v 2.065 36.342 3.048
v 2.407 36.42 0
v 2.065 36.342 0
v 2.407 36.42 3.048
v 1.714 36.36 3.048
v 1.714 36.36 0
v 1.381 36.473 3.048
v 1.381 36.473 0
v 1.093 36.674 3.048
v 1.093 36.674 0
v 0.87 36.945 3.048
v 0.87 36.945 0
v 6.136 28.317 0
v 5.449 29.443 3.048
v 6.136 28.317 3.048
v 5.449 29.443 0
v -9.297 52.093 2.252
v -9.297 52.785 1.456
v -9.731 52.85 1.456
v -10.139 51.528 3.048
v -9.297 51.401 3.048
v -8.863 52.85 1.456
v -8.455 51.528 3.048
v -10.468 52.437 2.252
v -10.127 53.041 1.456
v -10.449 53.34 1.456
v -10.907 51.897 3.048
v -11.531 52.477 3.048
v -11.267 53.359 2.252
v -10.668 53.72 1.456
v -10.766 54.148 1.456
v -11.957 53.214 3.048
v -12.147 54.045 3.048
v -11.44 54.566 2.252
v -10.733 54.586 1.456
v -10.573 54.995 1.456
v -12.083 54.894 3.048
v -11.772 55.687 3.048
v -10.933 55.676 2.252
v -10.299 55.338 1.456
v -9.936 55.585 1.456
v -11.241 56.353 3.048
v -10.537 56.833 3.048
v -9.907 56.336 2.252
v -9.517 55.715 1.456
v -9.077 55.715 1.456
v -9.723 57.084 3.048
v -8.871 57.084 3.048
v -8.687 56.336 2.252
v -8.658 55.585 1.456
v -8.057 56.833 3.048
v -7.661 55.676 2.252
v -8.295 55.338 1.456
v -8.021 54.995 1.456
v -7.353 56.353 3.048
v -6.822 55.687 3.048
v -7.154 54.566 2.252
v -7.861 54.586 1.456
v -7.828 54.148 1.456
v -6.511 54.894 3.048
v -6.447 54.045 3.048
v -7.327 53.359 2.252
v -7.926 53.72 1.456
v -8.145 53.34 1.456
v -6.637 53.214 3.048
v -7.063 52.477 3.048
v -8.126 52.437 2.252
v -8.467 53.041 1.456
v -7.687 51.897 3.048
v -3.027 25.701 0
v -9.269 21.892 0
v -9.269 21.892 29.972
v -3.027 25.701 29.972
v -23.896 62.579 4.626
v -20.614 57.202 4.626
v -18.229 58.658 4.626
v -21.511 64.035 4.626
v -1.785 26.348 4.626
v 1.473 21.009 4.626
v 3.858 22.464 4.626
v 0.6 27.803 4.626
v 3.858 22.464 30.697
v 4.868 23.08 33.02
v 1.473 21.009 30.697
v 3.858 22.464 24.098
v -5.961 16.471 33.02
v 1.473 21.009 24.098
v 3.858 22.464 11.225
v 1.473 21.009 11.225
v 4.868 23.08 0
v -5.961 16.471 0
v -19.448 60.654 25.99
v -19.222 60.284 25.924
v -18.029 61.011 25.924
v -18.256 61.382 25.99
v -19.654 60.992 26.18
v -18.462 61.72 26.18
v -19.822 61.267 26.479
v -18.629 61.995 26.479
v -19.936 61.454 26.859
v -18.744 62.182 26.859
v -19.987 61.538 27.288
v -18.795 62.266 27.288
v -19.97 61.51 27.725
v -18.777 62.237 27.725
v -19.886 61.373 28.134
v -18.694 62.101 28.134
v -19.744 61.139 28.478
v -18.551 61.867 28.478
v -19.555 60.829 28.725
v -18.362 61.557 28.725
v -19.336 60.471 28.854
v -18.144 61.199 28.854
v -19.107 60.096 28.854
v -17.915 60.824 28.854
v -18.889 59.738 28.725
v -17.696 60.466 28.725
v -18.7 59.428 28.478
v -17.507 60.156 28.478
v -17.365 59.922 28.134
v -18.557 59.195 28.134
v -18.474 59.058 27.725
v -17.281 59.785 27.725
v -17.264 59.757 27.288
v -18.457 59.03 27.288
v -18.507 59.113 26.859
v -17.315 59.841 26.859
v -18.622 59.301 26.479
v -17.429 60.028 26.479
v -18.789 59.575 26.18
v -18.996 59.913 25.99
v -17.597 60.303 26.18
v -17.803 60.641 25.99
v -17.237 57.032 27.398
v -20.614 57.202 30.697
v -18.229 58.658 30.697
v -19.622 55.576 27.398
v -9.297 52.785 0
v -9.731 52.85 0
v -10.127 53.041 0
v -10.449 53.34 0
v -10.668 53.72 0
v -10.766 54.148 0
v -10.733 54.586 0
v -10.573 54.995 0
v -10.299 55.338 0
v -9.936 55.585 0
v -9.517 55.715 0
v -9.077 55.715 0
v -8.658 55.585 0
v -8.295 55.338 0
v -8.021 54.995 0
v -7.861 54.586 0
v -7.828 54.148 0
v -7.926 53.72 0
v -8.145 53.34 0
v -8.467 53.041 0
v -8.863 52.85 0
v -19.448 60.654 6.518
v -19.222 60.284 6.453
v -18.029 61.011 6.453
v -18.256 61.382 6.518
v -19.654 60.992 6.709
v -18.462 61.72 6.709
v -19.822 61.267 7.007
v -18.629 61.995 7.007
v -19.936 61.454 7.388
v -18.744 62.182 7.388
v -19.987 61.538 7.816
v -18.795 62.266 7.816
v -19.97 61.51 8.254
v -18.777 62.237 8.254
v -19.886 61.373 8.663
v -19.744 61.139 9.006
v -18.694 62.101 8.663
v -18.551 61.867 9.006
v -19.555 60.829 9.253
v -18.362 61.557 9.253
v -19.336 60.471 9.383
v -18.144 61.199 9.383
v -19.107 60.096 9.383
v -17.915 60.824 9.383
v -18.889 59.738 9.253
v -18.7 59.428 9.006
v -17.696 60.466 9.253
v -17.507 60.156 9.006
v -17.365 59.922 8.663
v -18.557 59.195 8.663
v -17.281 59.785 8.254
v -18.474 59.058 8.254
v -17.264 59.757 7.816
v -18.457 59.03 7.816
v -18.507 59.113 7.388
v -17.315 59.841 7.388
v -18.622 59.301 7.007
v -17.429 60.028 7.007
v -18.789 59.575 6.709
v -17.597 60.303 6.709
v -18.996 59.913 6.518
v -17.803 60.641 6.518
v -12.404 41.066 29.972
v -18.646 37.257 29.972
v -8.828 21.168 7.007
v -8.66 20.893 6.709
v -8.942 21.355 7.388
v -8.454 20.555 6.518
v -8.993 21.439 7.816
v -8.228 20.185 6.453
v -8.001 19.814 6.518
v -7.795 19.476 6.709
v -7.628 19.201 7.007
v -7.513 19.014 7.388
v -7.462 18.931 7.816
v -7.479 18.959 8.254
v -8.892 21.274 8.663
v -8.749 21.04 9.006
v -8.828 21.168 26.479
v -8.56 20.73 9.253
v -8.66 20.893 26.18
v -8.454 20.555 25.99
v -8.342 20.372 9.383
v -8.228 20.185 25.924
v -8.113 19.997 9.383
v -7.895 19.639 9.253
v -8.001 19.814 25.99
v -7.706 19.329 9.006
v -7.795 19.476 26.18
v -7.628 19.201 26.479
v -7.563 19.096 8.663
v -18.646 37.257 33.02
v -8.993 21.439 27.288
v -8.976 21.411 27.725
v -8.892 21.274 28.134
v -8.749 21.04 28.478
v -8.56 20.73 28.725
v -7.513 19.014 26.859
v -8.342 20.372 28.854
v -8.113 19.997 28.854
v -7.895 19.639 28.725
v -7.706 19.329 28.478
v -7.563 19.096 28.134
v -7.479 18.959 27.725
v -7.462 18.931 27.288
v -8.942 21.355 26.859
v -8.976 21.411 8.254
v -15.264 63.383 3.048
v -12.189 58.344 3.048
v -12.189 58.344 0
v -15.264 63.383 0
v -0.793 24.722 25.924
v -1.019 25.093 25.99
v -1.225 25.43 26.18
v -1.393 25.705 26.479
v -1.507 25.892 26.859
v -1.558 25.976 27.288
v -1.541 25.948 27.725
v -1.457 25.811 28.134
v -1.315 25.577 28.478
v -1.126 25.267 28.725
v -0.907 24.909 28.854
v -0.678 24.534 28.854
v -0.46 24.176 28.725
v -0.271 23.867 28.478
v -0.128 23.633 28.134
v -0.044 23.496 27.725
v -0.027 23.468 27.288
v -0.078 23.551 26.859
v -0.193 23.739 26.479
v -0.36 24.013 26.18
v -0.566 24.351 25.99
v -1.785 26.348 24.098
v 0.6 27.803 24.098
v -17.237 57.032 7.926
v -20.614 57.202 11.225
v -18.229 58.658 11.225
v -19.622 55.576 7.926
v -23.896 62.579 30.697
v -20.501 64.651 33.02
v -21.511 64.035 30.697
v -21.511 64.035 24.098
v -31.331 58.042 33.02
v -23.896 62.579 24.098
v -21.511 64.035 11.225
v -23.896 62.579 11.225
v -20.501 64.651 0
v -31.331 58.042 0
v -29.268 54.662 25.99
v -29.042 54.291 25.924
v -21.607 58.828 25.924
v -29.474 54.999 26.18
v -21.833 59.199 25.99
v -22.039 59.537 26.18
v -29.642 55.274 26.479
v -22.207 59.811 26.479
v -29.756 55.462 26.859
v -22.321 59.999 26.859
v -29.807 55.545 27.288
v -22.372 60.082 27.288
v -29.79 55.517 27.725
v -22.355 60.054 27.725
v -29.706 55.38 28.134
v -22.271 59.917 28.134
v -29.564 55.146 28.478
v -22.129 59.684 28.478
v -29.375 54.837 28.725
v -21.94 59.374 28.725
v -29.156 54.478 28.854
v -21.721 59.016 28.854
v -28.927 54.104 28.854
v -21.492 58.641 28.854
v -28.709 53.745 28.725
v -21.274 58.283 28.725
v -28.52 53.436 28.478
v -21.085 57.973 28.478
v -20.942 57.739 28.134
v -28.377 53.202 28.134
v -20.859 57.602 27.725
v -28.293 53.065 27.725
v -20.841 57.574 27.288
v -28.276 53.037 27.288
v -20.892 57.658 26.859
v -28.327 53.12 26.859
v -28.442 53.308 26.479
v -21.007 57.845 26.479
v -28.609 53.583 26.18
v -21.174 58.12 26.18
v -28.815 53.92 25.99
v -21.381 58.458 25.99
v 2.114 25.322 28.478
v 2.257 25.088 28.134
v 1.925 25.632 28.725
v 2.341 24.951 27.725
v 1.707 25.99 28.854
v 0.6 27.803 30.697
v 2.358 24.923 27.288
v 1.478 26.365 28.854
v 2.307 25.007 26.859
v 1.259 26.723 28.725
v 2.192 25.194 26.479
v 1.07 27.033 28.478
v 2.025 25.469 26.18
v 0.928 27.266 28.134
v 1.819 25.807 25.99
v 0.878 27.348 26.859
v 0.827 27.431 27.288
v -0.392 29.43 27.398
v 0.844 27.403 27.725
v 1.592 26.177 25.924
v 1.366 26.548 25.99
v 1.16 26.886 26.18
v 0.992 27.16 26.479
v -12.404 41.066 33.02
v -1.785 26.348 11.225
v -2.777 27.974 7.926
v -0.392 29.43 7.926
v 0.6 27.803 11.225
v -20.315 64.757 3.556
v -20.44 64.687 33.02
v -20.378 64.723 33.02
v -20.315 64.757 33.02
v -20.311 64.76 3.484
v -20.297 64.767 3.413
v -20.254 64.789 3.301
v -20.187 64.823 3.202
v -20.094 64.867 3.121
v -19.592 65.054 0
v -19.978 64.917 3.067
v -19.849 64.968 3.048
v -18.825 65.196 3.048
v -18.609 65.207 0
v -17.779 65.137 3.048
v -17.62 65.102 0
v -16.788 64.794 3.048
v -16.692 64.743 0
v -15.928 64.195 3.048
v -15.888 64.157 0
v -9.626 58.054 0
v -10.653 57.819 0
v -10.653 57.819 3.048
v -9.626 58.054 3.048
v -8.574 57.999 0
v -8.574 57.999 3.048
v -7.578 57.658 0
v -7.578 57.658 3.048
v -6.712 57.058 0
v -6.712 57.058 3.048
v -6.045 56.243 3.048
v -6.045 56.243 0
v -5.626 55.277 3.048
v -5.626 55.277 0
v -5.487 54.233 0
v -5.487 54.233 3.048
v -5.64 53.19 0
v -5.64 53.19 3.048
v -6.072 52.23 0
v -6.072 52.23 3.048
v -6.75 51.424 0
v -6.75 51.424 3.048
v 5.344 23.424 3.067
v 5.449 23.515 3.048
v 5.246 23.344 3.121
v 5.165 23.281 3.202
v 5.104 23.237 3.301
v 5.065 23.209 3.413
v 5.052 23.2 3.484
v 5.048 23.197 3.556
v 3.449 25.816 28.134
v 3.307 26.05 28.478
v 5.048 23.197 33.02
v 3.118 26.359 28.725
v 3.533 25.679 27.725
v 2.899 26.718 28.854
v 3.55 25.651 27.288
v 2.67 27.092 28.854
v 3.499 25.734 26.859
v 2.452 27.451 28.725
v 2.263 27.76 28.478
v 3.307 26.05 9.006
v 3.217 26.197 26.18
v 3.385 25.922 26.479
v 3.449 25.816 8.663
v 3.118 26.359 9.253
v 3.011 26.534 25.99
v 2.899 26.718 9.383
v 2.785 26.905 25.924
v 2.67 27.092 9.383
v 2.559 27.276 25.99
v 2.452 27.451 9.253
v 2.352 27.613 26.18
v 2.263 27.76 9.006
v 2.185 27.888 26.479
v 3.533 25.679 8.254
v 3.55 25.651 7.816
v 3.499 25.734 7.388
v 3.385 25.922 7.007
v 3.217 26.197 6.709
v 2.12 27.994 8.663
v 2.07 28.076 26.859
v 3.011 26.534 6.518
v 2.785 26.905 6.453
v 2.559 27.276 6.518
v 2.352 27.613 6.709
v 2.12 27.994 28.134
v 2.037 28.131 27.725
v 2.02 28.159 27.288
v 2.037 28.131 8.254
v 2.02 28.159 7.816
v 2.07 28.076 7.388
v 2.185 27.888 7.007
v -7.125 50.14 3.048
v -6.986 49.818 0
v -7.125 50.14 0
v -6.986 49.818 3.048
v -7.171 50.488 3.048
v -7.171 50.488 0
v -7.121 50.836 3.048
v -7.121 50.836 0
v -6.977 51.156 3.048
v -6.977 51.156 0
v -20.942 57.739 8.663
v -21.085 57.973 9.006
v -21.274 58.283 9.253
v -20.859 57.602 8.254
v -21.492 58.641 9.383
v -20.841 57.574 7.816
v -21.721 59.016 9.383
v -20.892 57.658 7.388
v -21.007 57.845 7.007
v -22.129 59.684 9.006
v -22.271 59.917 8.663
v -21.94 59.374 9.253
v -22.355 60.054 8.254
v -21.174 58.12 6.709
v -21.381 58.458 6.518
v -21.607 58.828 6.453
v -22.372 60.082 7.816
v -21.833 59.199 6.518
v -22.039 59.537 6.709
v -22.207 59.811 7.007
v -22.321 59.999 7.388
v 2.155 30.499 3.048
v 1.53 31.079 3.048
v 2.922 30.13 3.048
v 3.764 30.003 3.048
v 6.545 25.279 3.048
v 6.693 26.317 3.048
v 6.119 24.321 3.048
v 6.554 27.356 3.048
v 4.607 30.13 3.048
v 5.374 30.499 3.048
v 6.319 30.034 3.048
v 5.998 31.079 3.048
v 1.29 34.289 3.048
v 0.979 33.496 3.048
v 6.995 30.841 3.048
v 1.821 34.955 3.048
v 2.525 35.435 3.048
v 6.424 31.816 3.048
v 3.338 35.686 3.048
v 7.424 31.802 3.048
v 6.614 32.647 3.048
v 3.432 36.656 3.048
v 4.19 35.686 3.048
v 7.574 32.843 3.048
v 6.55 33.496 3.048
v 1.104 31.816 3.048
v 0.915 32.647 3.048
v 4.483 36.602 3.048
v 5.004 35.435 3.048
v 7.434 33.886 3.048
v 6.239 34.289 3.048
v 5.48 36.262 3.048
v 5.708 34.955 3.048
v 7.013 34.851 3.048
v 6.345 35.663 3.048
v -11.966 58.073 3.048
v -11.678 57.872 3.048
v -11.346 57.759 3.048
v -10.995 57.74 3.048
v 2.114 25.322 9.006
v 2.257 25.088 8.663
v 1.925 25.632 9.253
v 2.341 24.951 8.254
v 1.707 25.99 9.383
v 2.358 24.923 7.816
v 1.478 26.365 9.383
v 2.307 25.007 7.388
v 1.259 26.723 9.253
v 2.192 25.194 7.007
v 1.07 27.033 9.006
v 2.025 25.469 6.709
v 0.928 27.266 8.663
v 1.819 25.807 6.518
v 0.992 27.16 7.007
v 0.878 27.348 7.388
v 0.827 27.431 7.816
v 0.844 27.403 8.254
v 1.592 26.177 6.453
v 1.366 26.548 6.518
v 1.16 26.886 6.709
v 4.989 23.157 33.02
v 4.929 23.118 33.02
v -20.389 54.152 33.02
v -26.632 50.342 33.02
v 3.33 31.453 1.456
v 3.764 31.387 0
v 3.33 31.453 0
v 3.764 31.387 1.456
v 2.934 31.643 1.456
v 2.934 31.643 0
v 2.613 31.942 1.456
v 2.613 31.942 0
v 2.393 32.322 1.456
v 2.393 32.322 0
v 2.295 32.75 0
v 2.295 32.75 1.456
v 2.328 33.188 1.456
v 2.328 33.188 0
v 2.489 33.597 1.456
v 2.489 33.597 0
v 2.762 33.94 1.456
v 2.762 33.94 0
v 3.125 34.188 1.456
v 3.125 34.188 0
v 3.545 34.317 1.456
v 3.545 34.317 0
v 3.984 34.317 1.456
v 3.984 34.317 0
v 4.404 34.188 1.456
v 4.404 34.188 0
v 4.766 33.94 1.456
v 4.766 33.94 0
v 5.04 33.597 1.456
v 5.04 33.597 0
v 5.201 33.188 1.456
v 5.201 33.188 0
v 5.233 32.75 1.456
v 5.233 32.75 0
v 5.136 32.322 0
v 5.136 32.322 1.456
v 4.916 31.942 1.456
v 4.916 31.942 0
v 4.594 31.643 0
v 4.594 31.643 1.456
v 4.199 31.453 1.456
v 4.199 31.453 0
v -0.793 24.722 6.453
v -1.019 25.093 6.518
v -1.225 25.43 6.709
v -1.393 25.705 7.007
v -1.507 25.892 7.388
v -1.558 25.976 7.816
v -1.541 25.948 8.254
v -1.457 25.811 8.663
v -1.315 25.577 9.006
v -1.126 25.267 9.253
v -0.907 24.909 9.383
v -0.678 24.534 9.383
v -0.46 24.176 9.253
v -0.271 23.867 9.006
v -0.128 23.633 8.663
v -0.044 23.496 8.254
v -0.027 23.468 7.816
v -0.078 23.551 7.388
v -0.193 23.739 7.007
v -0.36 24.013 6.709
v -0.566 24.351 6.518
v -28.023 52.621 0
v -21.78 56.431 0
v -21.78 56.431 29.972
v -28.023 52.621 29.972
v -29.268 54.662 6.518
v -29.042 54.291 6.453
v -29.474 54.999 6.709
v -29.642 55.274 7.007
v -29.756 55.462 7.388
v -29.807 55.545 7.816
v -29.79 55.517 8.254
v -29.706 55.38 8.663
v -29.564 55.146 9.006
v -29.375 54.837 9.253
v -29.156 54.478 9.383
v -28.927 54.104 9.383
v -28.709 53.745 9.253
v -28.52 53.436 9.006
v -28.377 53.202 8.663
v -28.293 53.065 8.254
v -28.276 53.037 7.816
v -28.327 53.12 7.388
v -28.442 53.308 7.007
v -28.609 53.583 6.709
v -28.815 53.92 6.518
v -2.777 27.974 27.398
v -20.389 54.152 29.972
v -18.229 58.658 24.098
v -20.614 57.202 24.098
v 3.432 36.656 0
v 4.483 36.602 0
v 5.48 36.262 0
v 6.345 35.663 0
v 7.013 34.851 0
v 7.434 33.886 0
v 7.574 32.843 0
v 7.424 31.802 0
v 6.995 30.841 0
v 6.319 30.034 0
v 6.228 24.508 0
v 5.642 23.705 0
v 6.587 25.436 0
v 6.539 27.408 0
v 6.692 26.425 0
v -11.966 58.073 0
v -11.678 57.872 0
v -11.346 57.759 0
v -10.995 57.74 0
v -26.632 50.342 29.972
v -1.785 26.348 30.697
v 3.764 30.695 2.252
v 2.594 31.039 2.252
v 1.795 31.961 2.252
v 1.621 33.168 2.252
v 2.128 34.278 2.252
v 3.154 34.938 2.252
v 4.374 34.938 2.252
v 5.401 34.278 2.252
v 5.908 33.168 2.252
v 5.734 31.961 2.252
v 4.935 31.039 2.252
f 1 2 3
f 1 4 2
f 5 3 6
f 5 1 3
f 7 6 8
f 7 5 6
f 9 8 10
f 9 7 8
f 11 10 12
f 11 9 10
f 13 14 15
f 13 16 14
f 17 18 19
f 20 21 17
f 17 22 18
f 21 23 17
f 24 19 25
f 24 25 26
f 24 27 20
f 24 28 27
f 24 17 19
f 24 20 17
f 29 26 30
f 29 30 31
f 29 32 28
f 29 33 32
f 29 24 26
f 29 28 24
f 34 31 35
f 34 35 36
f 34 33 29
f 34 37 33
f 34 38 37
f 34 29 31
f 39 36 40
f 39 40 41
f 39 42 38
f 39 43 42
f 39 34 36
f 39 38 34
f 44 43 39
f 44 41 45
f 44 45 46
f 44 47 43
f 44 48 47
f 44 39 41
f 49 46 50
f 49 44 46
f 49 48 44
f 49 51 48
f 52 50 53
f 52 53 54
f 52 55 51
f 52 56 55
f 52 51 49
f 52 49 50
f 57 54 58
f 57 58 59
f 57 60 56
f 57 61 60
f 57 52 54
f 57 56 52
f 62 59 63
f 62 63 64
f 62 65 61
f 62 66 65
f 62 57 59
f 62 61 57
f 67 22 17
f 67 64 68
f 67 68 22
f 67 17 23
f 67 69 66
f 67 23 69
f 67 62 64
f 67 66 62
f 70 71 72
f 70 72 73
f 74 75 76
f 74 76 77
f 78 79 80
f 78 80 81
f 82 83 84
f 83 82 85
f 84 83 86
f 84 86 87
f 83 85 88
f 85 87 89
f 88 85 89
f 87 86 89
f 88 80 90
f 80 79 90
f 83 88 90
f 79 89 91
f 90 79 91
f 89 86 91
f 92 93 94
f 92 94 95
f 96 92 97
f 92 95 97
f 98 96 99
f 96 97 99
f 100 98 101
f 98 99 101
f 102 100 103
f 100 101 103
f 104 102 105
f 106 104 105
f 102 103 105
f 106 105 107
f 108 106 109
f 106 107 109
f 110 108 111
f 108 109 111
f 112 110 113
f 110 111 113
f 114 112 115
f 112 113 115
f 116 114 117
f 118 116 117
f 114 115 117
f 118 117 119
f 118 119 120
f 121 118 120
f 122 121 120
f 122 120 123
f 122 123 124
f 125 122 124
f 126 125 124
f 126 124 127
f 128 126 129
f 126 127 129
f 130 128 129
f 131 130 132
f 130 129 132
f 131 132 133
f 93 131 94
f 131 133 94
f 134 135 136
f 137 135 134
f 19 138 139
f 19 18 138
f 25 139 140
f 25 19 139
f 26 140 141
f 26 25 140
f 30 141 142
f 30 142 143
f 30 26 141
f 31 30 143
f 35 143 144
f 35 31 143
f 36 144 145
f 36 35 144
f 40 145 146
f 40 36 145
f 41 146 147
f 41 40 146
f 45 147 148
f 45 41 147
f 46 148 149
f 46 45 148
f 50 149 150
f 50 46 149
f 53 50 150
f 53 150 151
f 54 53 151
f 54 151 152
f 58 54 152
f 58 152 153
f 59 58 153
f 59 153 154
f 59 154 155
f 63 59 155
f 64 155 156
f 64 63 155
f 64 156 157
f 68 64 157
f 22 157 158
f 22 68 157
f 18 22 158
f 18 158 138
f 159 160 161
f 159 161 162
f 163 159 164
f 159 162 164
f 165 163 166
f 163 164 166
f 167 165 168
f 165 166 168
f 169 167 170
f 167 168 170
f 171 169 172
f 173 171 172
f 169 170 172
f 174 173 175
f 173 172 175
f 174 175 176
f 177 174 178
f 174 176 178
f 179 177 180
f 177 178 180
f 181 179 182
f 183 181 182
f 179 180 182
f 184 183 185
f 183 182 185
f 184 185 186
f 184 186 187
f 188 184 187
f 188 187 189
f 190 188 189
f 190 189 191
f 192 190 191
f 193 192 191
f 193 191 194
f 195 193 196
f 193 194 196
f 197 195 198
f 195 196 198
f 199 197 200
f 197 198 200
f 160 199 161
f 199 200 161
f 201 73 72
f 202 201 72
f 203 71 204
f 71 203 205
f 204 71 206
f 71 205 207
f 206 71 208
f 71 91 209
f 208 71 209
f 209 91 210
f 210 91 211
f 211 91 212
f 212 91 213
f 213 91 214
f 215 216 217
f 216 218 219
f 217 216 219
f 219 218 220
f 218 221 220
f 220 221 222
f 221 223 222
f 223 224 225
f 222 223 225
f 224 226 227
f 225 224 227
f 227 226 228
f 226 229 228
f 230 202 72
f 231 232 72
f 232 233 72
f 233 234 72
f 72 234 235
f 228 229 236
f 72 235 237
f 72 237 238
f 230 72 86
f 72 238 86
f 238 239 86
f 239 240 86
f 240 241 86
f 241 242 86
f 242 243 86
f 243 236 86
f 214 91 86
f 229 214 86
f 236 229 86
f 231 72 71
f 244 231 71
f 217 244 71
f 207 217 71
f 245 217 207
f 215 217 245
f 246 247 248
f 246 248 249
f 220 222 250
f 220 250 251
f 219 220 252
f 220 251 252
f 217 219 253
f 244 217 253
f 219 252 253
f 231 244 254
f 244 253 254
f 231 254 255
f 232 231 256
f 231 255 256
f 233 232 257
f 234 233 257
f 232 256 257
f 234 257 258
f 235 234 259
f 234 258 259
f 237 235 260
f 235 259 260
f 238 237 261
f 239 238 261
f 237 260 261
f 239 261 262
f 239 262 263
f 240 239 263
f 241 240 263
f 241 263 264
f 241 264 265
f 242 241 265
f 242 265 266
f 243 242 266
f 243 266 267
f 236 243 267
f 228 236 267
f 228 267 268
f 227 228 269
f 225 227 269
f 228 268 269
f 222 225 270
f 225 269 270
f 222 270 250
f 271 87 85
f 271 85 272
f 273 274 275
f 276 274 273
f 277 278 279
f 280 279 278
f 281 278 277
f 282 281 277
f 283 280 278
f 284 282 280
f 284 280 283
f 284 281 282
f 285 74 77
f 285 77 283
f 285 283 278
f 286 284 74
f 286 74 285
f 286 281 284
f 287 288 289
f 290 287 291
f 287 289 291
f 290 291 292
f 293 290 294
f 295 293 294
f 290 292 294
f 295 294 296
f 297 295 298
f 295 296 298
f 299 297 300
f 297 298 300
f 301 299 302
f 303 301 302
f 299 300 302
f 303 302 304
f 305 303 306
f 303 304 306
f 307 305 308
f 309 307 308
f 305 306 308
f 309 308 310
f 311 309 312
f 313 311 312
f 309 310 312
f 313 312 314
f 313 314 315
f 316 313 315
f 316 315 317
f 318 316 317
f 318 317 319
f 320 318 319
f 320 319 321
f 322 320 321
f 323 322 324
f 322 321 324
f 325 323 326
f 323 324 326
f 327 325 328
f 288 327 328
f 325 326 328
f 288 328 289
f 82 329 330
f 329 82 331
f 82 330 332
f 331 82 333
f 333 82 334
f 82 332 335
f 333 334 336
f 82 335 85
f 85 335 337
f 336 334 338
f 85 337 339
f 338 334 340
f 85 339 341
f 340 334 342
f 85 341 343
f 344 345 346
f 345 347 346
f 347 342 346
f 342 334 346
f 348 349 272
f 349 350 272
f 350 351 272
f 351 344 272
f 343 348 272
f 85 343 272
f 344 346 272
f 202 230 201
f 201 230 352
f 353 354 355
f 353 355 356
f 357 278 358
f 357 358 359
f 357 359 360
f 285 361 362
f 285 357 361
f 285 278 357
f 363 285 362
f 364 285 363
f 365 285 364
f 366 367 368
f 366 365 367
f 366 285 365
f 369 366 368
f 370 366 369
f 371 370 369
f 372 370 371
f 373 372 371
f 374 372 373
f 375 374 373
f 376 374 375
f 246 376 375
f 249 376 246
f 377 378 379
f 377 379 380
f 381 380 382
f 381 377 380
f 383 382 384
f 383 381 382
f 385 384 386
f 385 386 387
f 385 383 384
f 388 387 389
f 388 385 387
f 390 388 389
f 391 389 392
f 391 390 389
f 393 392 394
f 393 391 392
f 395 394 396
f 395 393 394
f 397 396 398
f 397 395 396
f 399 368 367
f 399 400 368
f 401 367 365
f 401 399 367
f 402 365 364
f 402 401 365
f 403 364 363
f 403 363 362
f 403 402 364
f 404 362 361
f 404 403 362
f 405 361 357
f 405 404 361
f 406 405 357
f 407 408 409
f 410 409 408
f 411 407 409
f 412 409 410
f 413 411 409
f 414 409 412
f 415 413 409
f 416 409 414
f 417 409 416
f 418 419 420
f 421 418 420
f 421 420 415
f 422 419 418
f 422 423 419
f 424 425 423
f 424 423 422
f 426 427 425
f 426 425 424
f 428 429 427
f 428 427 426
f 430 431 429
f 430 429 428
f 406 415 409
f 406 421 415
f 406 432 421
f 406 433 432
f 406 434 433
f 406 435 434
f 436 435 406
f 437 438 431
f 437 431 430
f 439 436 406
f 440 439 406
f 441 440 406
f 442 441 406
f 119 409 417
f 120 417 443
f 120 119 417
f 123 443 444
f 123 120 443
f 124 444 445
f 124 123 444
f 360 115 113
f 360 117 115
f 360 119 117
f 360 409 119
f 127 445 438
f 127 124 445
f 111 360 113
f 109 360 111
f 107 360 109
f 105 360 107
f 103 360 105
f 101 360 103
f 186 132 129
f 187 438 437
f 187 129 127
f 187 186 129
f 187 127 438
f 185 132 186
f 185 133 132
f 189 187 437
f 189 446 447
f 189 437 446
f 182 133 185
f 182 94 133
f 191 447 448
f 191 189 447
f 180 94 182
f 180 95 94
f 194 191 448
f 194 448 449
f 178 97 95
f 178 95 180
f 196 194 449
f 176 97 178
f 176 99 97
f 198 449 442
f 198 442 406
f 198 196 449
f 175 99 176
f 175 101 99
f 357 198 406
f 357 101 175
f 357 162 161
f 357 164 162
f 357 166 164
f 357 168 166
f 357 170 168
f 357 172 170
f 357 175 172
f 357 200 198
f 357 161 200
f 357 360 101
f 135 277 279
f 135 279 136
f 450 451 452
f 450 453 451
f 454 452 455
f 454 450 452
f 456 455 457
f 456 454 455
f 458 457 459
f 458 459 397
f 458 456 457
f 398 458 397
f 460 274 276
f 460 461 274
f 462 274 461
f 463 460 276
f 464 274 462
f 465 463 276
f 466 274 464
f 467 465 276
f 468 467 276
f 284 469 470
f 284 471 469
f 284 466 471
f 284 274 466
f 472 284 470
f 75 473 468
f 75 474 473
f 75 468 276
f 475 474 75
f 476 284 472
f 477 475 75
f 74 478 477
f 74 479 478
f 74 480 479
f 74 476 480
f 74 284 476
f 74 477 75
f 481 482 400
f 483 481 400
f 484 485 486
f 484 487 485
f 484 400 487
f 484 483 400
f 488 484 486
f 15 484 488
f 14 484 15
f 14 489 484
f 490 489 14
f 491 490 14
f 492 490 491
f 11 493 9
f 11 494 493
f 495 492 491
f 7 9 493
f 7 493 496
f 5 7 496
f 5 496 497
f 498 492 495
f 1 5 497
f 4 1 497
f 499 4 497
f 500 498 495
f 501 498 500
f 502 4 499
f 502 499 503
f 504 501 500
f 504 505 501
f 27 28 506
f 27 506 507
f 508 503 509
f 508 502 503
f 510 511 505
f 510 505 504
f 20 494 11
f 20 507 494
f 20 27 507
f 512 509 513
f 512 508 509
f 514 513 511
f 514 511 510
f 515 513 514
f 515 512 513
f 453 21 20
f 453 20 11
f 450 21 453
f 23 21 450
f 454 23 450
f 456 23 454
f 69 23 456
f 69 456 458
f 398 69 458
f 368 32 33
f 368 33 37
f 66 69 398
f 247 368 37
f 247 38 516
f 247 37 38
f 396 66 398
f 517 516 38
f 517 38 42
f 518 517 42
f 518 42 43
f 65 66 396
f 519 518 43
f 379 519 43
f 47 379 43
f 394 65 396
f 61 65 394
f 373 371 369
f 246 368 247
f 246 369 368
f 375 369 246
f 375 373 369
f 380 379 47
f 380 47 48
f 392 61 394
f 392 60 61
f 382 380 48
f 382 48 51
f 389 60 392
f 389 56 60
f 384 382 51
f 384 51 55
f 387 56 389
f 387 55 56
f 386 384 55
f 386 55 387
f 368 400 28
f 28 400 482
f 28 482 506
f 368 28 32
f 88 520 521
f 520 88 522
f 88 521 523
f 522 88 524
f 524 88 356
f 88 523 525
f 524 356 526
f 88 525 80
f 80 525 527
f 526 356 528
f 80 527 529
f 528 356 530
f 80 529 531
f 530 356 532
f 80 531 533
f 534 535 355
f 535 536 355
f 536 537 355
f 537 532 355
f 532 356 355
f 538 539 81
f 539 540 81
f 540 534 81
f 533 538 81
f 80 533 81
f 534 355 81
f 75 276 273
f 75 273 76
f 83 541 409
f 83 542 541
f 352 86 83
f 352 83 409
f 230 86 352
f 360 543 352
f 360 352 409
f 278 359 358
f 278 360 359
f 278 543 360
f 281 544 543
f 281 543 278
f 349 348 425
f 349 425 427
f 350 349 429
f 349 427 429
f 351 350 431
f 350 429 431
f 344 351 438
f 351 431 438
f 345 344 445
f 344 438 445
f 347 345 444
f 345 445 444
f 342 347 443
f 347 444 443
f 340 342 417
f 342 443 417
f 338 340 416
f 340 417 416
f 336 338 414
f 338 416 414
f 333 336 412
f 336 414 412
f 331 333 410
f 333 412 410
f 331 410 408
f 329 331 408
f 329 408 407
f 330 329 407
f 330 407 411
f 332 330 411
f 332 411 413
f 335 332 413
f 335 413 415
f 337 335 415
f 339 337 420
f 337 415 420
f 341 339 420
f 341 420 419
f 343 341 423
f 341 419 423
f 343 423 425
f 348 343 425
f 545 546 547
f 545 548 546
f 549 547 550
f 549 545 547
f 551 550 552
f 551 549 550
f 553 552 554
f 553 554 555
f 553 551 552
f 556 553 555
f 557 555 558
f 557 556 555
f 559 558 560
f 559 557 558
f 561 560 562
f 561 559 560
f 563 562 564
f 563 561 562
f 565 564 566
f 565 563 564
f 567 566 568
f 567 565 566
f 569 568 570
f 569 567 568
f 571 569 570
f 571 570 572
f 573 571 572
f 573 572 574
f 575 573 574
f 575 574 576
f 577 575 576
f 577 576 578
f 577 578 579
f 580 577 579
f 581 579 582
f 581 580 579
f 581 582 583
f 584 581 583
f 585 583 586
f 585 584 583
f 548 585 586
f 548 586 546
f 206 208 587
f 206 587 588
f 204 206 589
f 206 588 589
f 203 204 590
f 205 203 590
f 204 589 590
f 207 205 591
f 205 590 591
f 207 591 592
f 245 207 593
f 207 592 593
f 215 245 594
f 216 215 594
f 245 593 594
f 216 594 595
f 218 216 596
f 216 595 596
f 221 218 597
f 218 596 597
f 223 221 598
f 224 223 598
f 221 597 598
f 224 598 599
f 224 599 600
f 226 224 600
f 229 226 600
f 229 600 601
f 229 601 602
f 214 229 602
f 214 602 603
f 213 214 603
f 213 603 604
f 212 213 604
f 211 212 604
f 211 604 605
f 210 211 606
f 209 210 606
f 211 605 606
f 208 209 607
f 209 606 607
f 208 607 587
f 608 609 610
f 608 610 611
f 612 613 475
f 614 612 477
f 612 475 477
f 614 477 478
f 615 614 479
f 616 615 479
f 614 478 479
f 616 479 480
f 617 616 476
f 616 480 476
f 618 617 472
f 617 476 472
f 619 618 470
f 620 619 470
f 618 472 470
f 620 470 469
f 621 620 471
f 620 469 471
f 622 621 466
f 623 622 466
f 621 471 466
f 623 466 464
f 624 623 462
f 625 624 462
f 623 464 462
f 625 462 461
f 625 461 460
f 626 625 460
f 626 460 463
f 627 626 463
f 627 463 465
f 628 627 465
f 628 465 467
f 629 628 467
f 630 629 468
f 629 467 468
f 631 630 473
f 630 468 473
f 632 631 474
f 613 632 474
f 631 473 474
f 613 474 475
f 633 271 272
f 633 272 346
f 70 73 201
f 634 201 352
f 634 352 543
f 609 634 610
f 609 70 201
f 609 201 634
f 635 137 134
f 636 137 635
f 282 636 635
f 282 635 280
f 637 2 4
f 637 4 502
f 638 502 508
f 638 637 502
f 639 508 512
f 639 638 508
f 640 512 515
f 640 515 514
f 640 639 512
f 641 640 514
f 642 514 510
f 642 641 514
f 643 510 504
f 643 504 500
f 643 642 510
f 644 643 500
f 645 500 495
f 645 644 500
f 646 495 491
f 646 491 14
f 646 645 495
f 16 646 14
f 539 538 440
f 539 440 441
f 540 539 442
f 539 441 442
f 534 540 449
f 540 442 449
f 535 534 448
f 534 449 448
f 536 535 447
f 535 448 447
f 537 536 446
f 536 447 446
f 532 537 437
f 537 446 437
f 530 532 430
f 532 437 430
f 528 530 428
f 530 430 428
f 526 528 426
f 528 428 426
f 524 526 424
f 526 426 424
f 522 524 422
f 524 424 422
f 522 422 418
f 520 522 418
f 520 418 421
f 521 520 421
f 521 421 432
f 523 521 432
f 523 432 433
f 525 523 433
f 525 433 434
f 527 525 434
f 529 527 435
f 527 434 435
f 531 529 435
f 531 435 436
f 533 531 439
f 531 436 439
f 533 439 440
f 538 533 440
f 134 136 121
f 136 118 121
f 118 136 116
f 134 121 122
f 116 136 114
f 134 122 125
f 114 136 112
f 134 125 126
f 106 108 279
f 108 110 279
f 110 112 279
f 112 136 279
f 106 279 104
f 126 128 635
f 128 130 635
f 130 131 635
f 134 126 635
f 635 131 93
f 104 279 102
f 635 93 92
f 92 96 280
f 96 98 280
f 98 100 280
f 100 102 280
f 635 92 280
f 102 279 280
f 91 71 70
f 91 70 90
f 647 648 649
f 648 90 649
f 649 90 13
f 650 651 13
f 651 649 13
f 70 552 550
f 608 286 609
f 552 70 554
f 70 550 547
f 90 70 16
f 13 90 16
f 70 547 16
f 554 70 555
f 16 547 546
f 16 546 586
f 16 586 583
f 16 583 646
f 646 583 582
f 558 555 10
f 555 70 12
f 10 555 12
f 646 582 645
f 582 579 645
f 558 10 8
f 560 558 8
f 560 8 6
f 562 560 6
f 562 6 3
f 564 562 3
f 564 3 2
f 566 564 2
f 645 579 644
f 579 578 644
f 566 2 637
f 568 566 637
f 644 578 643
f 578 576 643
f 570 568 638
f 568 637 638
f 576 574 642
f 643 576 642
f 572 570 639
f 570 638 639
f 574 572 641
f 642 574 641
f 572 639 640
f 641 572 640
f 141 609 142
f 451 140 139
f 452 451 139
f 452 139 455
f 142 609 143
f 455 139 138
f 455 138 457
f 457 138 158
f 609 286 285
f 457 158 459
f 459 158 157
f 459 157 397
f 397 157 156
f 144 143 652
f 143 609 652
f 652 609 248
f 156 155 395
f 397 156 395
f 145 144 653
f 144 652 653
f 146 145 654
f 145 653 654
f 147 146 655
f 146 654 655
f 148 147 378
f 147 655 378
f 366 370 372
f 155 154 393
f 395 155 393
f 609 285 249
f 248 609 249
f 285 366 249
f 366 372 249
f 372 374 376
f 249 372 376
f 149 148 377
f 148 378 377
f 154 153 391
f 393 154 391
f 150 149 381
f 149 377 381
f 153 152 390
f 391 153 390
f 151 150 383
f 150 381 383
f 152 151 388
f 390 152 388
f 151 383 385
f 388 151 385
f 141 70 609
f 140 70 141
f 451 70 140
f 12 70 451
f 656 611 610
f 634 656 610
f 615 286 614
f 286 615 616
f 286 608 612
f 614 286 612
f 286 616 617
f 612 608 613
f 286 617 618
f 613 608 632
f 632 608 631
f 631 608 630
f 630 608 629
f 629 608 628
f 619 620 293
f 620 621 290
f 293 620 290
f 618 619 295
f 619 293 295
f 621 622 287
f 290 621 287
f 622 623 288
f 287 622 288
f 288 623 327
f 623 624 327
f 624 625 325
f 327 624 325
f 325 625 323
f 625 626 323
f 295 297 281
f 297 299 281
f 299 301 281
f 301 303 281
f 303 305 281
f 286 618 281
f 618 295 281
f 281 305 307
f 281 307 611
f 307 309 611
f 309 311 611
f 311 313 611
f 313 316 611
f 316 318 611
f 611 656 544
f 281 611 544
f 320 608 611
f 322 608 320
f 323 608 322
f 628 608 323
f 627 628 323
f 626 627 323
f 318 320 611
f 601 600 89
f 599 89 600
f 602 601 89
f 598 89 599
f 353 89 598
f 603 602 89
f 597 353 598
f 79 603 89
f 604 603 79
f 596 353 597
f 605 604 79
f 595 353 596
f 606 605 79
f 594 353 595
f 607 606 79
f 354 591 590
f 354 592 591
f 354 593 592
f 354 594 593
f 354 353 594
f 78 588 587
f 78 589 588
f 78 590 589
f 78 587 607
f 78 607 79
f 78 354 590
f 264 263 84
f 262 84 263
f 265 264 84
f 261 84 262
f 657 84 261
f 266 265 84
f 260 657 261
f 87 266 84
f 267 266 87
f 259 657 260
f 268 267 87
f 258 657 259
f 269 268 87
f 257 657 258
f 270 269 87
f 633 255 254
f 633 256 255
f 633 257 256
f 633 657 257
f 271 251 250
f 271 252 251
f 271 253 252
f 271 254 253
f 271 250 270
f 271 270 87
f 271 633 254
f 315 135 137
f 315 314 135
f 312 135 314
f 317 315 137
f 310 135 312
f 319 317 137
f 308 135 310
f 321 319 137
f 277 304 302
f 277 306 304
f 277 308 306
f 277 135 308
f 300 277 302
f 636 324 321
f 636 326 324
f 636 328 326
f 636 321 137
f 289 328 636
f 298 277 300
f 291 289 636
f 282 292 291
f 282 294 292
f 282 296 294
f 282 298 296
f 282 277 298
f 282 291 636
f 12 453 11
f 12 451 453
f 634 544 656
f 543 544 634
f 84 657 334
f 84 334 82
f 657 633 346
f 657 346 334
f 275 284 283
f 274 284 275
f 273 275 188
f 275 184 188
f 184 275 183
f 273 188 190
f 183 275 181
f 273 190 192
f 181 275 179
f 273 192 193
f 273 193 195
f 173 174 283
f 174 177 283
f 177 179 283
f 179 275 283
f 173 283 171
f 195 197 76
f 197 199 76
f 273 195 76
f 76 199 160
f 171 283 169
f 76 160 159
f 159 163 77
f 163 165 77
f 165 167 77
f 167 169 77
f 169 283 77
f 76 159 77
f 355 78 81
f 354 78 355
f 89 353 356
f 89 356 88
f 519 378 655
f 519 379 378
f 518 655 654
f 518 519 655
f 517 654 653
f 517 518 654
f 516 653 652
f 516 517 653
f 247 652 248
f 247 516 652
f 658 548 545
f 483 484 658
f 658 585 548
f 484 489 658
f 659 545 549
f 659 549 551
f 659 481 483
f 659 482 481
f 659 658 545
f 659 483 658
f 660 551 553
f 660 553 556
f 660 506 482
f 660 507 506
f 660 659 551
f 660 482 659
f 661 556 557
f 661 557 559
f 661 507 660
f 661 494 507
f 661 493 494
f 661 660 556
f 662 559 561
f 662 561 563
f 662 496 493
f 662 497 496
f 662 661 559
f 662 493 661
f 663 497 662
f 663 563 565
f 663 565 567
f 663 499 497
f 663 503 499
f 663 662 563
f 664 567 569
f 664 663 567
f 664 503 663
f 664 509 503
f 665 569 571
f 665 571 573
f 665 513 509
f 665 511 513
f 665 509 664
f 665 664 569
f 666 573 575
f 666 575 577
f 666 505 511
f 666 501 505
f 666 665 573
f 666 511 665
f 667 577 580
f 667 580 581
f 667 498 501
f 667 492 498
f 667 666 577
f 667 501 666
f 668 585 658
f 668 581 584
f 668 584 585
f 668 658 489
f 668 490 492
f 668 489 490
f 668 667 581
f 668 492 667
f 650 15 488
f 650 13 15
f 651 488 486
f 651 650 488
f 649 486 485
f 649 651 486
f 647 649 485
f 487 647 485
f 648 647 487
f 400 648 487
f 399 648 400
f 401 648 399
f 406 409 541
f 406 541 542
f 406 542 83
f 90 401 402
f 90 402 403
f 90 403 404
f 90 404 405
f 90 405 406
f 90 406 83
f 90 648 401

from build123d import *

# Parameters (mm, degrees)
BOSS_EXTRUDE1_DEPTH                               = 3.048
BOSS_EXTRUDE2_DEPTH                               = 29.971999999999998
BOSS_EXTRUDE3_DEPTH                               = 3.048
BOSS_EXTRUDE4_DEPTH                               = 3.048
SKETCH13_W                                        = 29.972
SKETCH13_H                                        = 48.7
BOSS_EXTRUDE5_DEPTH                               = 3.048
CSK_FOR_4_FLAT_HEAD_MACHINE_SCREW_100_D           = 2.9464
CSK_FOR_4_FLAT_HEAD_MACHINE_SCREW_100_CSINK_D     = 5.715
CSK_FOR_4_FLAT_HEAD_MACHINE_SCREW_100_CSINK_ANGLE = 100
CUT_EXTRUDE1_DEPTH                                = 1.397
CUT_EXTRUDE1_DEPTH_BACK                           = 1.397
SKETCH15_R                                        = 9.184035329670005
SKETCH15_R_2                                      = 8.124741076595411
SKETCH15_R_3                                      = 8.201451240556812
SKETCH15_R_4                                      = 5.810172256980604
BOSS_EXTRUDE6_DEPTH                               = 3.048
CSK_FOR_4_FLAT_HEAD_MACHINE_SCREW1_AT_2_COUNT     = 2
CSK_FOR_4_FLAT_HEAD_MACHINE_SCREW1_AT_2_PITCH     = 35.474094707842795
CSK_FOR_4_FLAT_HEAD_MACHINE_SCREW1_AT_3_COUNT     = 2
CSK_FOR_4_FLAT_HEAD_MACHINE_SCREW1_AT_3_PITCH     = 43.70753982500484
CSK_FOR_4_FLAT_HEAD_MACHINE_SCREW1_AT_4_COUNT     = 2
CSK_FOR_4_FLAT_HEAD_MACHINE_SCREW1_AT_4_PITCH     = 25.069264350610375
CUT_EXTRUDE2_DEPTH                                = 3.048
FILLET3_R                                         = 3.8099999999999996
FILLET4_R                                         = 1.27
SKETCH21_W                                        = 2.540000000000001
SKETCH21_H                                        = 33.02
CUT_EXTRUDE3_DEPTH                                = 77.47
FILLET5_R                                         = 0.508
FILLET6_R                                         = 0.508
SKETCH22_W                                        = 123.04970813102194
SKETCH22_H                                        = 134.7131875745612
CUT_EXTRUDE4_DEPTH                                = 77.47


with BuildPart() as part:
    # Sketch2 → Boss-Extrude1 (new body)
    with BuildSketch(Plane.XY):
        Polygon((-47.58059551455695, 48.12489153745831), (-22.21147896413696, 6.554494312375088), (5.701292889255674, 23.58878817682547), (-19.667823661164306, 65.1591854019087), align=None)
        Polygon((-38.85234269167306, 46.0124042215628), (-20.098991648241444, 15.282747135258976), (-3.0269599336282123, 25.701275492720985), (-21.78031097705982, 56.430932579024805), align=None, mode=Mode.SUBTRACT)
    extrude(amount=BOSS_EXTRUDE1_DEPTH)

    # Sketch3 → Boss-Extrude2 (add)
    with BuildSketch(Plane.XY.offset(3.048)):
        Polygon((2.4490708476218597, 21.604058524728963), (-22.920045702798127, 63.17445574981219), (-44.328373472923126, 50.10962118955482), (-18.95925692250314, 8.539223964471608), align=None)
        Polygon((-38.85234269167306, 46.0124042215628), (-20.098991648241444, 15.282747135258976), (-3.0269599336282087, 25.701275492720985), (-21.78031097705982, 56.430932579024805), align=None, mode=Mode.SUBTRACT)
    extrude(amount=BOSS_EXTRUDE2_DEPTH)

    # Sketch4 → Boss-Extrude3 (add)
    with BuildSketch(Plane.XY.offset(33.02)):
        Polygon((-38.85234269167306, 46.0124042215628), (-37.46131723814535, 43.733039051773666), (-20.389285523532113, 54.15156740923567), (-21.78031097705982, 56.430932579024805), align=None)
        Polygon((-29.47566716995725, 30.647575678410885), (-12.403635455344016, 41.0661040358729), (-3.0269599336282087, 25.701275492720985), (-20.098991648241444, 15.282747135258976), align=None)
    extrude(amount=-BOSS_EXTRUDE3_DEPTH)

    # Sketch12 → Boss-Extrude4 (add)
    with BuildSketch(Plane.XY.offset(3.048)):
        Polygon((2.4490708476218597, 21.604058524728963), (5.701292889255674, 23.58878817682547), (8.120429940678708, 25.065112049236276), (-17.248686609741274, 66.6355092743195), (-22.920045702798127, 63.17445574981219), align=None)
    extrude(amount=-BOSS_EXTRUDE4_DEPTH)

    # Sketch13 → Boss-Extrude5 (add)
    with BuildSketch(Plane(origin=(11.391019162328917, 6.95158362794815, 0), x_dir=(0, 0, -1), z_dir=(0.8536015857306615, 0.5209264178731006, 0))):
        with Locations((-18.034000000000002, 41.515472911157566)):
            Rectangle(SKETCH13_W, SKETCH13_H)
    extrude(amount=BOSS_EXTRUDE5_DEPTH)

    # CSK for #4 Flat Head Machine Screw (100)2 (through all)
    with Locations(Plane(origin=(-10.017308607796087, -6.113250932309213, 0), x_dir=(0, 0, 1), z_dir=(-0.8536015857306615, -0.5209264178731007, 0))):
        with Locations((27.397617355, 61.471448289), (7.925915452, 61.471448289), (7.925915452, 21.515515982), (27.397617355, 21.515515982)):
            CounterSinkHole(CSK_FOR_4_FLAT_HEAD_MACHINE_SCREW_100_D / 2, CSK_FOR_4_FLAT_HEAD_MACHINE_SCREW_100_CSINK_D / 2, counter_sink_angle=CSK_FOR_4_FLAT_HEAD_MACHINE_SCREW_100_CSINK_ANGLE)

    # Sketch14 → Cut-Extrude1 (cut, two sides: drawn at the far end of the back side and taken through both)
    with BuildSketch(Plane(origin=(11.607833965104508, 7.083898938087922, 0), x_dir=(0, 0, -1), z_dir=(0.8536015857306615, 0.5209264178731005, 0)).offset(-CUT_EXTRUDE1_DEPTH_BACK)):
        Polygon((-30.697174143874744, 19.61051598216394), (-30.697174143874744, 14.979833054183299), (-24.09806056703731, 14.979833054183299), (-24.09806056703731, 19.610515982163985), (-24.098060567037347, 23.42051598216399), (-27.39761735545604, 25.325515982163957), (-30.697174143874758, 23.420515982163952), align=None)
        Polygon((-27.39761735545604, 57.661448288693826), (-24.098060567037333, 59.56644828869383), (-24.098060567037336, 63.37644828869381), (-24.098060567037336, 70.99644828869384), (-30.69717414387474, 70.99644828869384), (-30.69717414387474, 63.37644828869381), (-30.69717414387474, 59.56644828869381), align=None)
        Polygon((-7.925915451689084, 57.661448288693826), (-4.626358663270381, 59.56644828869382), (-4.626358663270402, 63.37644828869381), (-4.626358663270402, 70.99644828869384), (-11.225472240107786, 70.99644828869384), (-11.225472240107786, 63.376448288693766), (-11.225472240107747, 59.566448288693785), align=None)
        Polygon((-7.925915451689081, 25.325515982163946), (-11.225472240107791, 23.42051598216395), (-11.225472240107791, 19.610515982163946), (-11.225472240107791, 14.979833054183299), (-4.626358663270366, 14.979833054183299), (-4.626358663270366, 19.610515982163953), (-4.6263586632703655, 23.420515982163952), align=None)
    extrude(amount=CUT_EXTRUDE1_DEPTH + CUT_EXTRUDE1_DEPTH_BACK, mode=Mode.SUBTRACT)

    # Sketch15 → Boss-Extrude6 (add)
    with BuildSketch(Plane(origin=(0, 0, 0), x_dir=(-1, 0, 0), z_dir=(0, 0, -1))):
        with Locations((9.758086495919196, 54.36124573948299)):
            Circle(SKETCH15_R)
        with Locations((39.927818301519274, 35.58488100974543)):
            Circle(SKETCH15_R_2)
        with Locations((25.610425726235285, 18.04643091882164)):
            Circle(SKETCH15_R_3)
        with Locations((-3.4576236647063787, 32.70568986323082)):
            Circle(SKETCH15_R_4)
    extrude(amount=-BOSS_EXTRUDE6_DEPTH)

    # Sketch19 → CSK for #4 Flat Head Machine Screw1 (revolve, cut)
    with BuildSketch(Plane(origin=(3.764373982237945, 32.86032278852424, 3.048), x_dir=(0, -1, 0), z_dir=(1, 0, 0))):
        Polygon((0, 0), (-7.5e-16, 3.0480000000000023), (1.4731999999999932, 3.0480000000000023), (1.4731999999999934, 1.59245498611605), (2.857499999999999, -1.73e-15), align=None)
    csk_for_4_flat_head_machine_screw1 = revolve(axis=Axis((3.764373982237945, 32.86032278852424, 9.39799999999999), (0, 0, -1)), mode=Mode.SUBTRACT)

    # CSK for #4 Flat Head Machine Screw1 at 2: CSK for #4 Flat Head Machine Screw1 ×2
    with Locations(*[Vector(-0.8506492202713736, -0.5257336816789507, 0) * (i * CSK_FOR_4_FLAT_HEAD_MACHINE_SCREW1_AT_2_PITCH) for i in range(1, CSK_FOR_4_FLAT_HEAD_MACHINE_SCREW1_AT_2_COUNT)]):
        add(csk_for_4_flat_head_machine_screw1, mode=Mode.SUBTRACT)

    # CSK for #4 Flat Head Machine Screw1 at 3: CSK for #4 Flat Head Machine Screw1 ×2
    with Locations(*[Vector(-0.997755305773639, 0.06696528802709796, 0) * (i * CSK_FOR_4_FLAT_HEAD_MACHINE_SCREW1_AT_3_PITCH) for i in range(1, CSK_FOR_4_FLAT_HEAD_MACHINE_SCREW1_AT_3_COUNT)]):
        add(csk_for_4_flat_head_machine_screw1, mode=Mode.SUBTRACT)

    # CSK for #4 Flat Head Machine Screw1 at 4: CSK for #4 Flat Head Machine Screw1 ×2
    with Locations(*[Vector(-0.5210117203175807, 0.8535495224600124, 0) * (i * CSK_FOR_4_FLAT_HEAD_MACHINE_SCREW1_AT_4_PITCH) for i in range(1, CSK_FOR_4_FLAT_HEAD_MACHINE_SCREW1_AT_4_COUNT)]):
        add(csk_for_4_flat_head_machine_screw1, mode=Mode.SUBTRACT)

    # Sketch20 → Cut-Extrude2 (cut)
    with BuildSketch(Plane(origin=(0, 0, 0), x_dir=(-1, 0, 0), z_dir=(0, 0, -1))):
        with BuildLine():
            Line((14.542293121824187, 62.20075286029573), (11.563953125478477, 57.32037886408755))
            ThreePointArc((11.563953125478477, 57.32037886408755), (6.044784522535942, 56.24291105550805), (7.610320649443919, 50.84186897257834))
            Line((7.610320649443919, 50.84186897257834), (-1.4954062126549716, 35.92102291440944))
            ThreePointArc((-1.4954062126549716, 35.92102291440944), (-7.016596023871767, 34.845052440620755), (-5.448804035753348, 29.442897530407524))
            Line((-5.448804035753348, 29.442897530407524), (-6.484295885760952, 27.746117611303884))
            Line((-6.484295885760952, 27.746117611303884), (-6.762670750549963, 27.28996638176623))
            Line((-6.762670750549963, 27.28996638176623), (-14.061950278269341, 31.74448896114331))
            Line((-14.061950278269341, 31.74448896114331), (8.559037851416688, 68.81174198534737))
            Line((8.559037851416688, 68.81174198534737), (14.542293121824187, 65.16034795406075))
            Line((14.542293121824187, 65.16034795406075), (14.542293121824187, 62.20075286029573))
        make_face()
        Polygon((21.78031097705982, 56.430932579024805), (38.85234269167306, 46.0124042215628), (20.098991648241444, 15.282747135258976), (3.0269599336282123, 25.701275492720985), align=None)
        with BuildLine():
            Line((22.21147896413696, 6.554494312375088), (24.781951964671258, 10.766528400207497))
            ThreePointArc((24.781951964671258, 10.766528400207497), (29.66385906245521, 12.225666721445755), (28.72915433514684, 17.23450177808784))
            Line((28.72915433514684, 17.23450177808784), (38.012718373529104, 32.44675577885475))
            ThreePointArc((38.012718373529104, 32.44675577885475), (43.097277822107074, 33.802481129765034), (41.97793801322115, 38.944252653808825))
            Line((41.97793801322115, 38.944252653808825), (47.58059551455695, 48.12489153745831))
            Line((47.58059551455695, 48.12489153745831), (51.80171473929435, 35.787210781861546))
            Line((51.80171473929435, 35.787210781861546), (47.57680035710003, 5.227667032097241))
            Line((47.57680035710003, 5.227667032097241), (22.21147896413696, 6.554494312375088))
        make_face()
    extrude(amount=-CUT_EXTRUDE2_DEPTH, mode=Mode.SUBTRACT)


with BuildPart() as body_2:
    # of the pieces the cut leaves, the one that is kept (cut_extrude2_keep)
    add(part.part.solids().sort_by_distance((-47.580595515, 48.124891537, 0))[0])

    # Fillet3
    fillet3_edges = [body_2.edges().sort_by_distance(p)[0] for p in [
        (-17.248686609741274, 66.6355092743195, 1.524),
        (-47.58059551455695, 48.12489153745831, 1.524),
        (-22.21147896413696, 6.554494312375088, 1.524),
        (8.120429940678708, 25.065112049236276, 1.524),
    ]]
    fillet(fillet3_edges, radius=FILLET3_R)

    # Fillet4
    fillet4_edges = [body_2.edges().sort_by_distance(p)[0] for p in [
        (1.4954062126549714, 35.92102291440944, 1.524),
        (-24.781951964671258, 10.766528400207495, 1.524),
        (-28.72915433514684, 17.23450177808784, 1.524),
        (-38.0127183735291, 32.44675577885475, 1.524),
        (-41.97793801322115, 38.94425265380882, 1.524),
        (-11.563953125478475, 57.320378864087544, 1.524),
        (-7.610320649443917, 50.84186897257834, 1.524),
    ]]
    fillet(fillet4_edges, radius=FILLET4_R)

    # Sketch21 → Cut-Extrude3 (cut)
    with BuildSketch(Plane(origin=(-8.941948314707059, 14.652474896780824, 0), x_dir=(0.8536015857306616, 0.5209264178731006, 0), z_dir=(0.5209264178731005, -0.8536015857306615, 0))):
        with Locations((2.2216732427396275, 16.51)):
            Rectangle(SKETCH21_W, SKETCH21_H)
    extrude(amount=-CUT_EXTRUDE3_DEPTH, mode=Mode.SUBTRACT)


with BuildPart() as cut_extrude3_piece_1:
    # of the separate pieces the step leaves, piece 1, a body of its own (cut_extrude3_pieces)
    add(body_2.part.solids().sort_by_distance((-12.188709065, 58.344117807, 0))[0])

    # Fillet6
    fillet6_edges = [cut_extrude3_piece_1.edges().sort_by_distance(p)[0] for p in [
        (-7.633709794281099, 43.97704085894782, 3.048),
    ]]
    fillet(fillet6_edges, radius=FILLET6_R)


with BuildPart() as cut_extrude3_piece_2:
    # of the separate pieces the step leaves, piece 2, a body of its own (cut_extrude3_pieces)
    add(body_2.part.solids().sort_by_distance((-42.532157132, 39.852408399, 0))[0])

    # Fillet5
    fillet5_edges = [cut_extrude3_piece_2.edges().sort_by_distance(p)[0] for p in [
        (-31.64381519771313, 29.324422577013216, 3.048),
    ]]
    fillet(fillet5_edges, radius=FILLET5_R)

    # Sketch22 → Cut-Extrude4 (cut)
    with BuildSketch(Plane(origin=(2.067982642978631, 1.2620252919381492, 0), x_dir=(0, 0, -1), z_dir=(0.8536015857306616, 0.5209264178731006, 0))):
        with Locations((-42.687564536567926, 74.45417523171726)):
            Rectangle(SKETCH22_W, SKETCH22_H)
    extrude(amount=-CUT_EXTRUDE4_DEPTH, mode=Mode.SUBTRACT)


solid = cut_extrude3_piece_1.part
